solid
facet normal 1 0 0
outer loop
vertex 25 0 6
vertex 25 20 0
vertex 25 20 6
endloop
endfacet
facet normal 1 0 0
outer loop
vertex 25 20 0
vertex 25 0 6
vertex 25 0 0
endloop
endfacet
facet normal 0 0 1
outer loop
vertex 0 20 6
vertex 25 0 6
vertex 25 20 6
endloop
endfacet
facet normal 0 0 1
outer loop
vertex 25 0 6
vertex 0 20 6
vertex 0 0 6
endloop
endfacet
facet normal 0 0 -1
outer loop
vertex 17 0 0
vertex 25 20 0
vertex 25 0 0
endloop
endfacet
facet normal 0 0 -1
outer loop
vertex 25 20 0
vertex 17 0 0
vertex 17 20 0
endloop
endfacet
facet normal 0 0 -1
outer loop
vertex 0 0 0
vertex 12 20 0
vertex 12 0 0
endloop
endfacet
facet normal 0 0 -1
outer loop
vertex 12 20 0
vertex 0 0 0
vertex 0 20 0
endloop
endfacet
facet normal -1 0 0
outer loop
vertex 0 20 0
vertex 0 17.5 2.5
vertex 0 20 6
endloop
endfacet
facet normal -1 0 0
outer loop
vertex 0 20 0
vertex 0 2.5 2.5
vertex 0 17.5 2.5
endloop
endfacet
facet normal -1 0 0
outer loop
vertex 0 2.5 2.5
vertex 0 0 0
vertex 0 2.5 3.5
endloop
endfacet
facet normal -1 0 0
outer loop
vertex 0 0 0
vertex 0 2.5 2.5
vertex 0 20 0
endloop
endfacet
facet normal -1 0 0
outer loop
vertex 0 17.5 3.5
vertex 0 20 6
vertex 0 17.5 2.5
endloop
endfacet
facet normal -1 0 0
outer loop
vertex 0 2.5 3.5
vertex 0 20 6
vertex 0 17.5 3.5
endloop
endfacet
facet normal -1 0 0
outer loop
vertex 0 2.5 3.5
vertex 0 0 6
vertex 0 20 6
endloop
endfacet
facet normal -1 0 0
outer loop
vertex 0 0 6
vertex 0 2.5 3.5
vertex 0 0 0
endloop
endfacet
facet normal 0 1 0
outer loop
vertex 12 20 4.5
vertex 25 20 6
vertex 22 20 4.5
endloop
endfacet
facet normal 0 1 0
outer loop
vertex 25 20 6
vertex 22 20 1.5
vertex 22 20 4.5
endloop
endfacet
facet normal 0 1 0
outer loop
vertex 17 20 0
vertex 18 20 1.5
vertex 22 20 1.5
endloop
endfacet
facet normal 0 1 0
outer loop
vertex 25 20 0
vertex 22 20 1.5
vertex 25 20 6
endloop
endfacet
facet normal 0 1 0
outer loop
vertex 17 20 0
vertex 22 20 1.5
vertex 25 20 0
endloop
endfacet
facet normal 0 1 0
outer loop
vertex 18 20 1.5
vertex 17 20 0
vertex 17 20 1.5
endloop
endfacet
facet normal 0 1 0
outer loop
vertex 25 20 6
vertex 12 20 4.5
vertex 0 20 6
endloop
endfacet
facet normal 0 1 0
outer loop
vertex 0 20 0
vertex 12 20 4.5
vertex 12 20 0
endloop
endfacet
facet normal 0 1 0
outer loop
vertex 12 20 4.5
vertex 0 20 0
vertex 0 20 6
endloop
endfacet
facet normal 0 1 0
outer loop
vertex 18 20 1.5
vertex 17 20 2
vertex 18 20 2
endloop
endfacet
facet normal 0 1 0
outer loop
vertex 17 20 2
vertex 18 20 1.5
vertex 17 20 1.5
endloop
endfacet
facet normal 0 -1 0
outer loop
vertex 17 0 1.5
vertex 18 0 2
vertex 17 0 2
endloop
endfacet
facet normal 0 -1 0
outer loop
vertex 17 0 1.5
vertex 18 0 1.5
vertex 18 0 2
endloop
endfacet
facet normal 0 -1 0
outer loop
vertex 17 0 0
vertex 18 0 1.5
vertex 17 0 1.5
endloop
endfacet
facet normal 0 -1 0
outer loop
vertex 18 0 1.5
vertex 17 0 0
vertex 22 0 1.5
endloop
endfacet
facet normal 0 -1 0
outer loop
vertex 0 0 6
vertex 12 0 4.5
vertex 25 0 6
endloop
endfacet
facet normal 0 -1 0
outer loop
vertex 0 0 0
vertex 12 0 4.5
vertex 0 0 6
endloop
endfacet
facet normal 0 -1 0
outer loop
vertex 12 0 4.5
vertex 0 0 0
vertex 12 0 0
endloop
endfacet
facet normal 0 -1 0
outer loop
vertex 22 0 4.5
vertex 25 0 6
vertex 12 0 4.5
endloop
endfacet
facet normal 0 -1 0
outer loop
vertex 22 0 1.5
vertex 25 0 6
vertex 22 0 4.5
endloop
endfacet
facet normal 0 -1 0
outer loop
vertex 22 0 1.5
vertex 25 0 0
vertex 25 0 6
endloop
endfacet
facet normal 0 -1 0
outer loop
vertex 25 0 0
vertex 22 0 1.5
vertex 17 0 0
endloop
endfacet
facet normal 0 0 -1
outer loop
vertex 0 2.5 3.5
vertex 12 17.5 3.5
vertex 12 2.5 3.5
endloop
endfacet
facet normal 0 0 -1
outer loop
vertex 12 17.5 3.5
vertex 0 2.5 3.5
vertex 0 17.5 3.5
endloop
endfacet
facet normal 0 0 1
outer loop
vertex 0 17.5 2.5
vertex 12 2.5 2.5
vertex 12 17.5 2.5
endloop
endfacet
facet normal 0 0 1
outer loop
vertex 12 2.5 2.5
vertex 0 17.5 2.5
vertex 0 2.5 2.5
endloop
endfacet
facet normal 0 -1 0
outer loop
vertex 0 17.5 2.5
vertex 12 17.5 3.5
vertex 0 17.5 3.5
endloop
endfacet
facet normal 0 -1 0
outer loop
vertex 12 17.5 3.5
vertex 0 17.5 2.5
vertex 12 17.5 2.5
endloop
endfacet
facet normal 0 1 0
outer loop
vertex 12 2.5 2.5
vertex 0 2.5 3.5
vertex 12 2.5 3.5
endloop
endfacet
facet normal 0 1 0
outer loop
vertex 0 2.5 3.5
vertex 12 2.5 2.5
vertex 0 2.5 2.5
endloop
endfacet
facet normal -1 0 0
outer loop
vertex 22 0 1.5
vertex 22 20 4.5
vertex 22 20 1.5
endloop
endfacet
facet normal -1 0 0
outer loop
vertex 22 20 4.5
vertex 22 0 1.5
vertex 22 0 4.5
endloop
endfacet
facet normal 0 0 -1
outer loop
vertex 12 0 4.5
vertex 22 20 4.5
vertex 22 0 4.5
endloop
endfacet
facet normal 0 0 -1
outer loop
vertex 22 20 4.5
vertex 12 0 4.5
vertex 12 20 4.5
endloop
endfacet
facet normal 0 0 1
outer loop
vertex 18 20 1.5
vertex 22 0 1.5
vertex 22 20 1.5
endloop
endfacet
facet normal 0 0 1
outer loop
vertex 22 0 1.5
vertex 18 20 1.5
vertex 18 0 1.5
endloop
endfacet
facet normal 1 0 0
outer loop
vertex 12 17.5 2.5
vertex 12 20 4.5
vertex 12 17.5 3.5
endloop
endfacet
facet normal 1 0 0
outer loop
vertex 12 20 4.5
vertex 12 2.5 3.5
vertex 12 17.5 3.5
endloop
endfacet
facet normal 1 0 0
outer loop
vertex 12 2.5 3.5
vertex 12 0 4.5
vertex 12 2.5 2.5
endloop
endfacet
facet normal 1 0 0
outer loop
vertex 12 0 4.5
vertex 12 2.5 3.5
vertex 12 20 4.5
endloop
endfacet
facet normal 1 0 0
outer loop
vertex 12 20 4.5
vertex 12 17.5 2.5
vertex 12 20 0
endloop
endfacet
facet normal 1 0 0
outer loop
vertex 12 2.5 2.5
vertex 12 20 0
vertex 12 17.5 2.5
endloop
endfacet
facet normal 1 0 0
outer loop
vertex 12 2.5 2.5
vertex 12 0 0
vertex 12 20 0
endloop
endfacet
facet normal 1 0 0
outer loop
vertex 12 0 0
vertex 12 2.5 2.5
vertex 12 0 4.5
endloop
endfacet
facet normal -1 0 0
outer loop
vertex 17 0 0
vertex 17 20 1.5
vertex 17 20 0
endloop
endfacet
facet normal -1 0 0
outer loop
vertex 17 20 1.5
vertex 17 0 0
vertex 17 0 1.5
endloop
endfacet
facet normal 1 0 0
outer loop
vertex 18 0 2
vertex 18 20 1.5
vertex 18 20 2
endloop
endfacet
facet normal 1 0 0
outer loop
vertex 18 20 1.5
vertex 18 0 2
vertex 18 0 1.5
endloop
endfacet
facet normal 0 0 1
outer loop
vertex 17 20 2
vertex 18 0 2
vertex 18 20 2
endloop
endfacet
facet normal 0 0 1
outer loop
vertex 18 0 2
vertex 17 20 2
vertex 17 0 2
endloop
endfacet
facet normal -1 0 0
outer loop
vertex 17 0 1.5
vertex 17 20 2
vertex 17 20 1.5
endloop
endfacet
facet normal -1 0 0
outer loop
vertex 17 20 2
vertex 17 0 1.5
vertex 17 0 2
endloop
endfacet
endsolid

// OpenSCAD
    difference() {
    difference() {
     union() {
        
        translate([0, 0, 0])
        cube(size=[25, 20, 6]);
        
          
     
        
        
    }
    
     
        translate([0, 2.5, 2.5])
        cube(size=[15, 15, 1]);
    } 
    
    translate([12, -10, 1.5])
        cube(size=[10, 40, 3]);
    
     translate([12, -10, 0])
        cube(size=[5, 40, 3]);
}
 translate([17, 0, 1.5])
        cube(size=[1, 20, 0.5]);
